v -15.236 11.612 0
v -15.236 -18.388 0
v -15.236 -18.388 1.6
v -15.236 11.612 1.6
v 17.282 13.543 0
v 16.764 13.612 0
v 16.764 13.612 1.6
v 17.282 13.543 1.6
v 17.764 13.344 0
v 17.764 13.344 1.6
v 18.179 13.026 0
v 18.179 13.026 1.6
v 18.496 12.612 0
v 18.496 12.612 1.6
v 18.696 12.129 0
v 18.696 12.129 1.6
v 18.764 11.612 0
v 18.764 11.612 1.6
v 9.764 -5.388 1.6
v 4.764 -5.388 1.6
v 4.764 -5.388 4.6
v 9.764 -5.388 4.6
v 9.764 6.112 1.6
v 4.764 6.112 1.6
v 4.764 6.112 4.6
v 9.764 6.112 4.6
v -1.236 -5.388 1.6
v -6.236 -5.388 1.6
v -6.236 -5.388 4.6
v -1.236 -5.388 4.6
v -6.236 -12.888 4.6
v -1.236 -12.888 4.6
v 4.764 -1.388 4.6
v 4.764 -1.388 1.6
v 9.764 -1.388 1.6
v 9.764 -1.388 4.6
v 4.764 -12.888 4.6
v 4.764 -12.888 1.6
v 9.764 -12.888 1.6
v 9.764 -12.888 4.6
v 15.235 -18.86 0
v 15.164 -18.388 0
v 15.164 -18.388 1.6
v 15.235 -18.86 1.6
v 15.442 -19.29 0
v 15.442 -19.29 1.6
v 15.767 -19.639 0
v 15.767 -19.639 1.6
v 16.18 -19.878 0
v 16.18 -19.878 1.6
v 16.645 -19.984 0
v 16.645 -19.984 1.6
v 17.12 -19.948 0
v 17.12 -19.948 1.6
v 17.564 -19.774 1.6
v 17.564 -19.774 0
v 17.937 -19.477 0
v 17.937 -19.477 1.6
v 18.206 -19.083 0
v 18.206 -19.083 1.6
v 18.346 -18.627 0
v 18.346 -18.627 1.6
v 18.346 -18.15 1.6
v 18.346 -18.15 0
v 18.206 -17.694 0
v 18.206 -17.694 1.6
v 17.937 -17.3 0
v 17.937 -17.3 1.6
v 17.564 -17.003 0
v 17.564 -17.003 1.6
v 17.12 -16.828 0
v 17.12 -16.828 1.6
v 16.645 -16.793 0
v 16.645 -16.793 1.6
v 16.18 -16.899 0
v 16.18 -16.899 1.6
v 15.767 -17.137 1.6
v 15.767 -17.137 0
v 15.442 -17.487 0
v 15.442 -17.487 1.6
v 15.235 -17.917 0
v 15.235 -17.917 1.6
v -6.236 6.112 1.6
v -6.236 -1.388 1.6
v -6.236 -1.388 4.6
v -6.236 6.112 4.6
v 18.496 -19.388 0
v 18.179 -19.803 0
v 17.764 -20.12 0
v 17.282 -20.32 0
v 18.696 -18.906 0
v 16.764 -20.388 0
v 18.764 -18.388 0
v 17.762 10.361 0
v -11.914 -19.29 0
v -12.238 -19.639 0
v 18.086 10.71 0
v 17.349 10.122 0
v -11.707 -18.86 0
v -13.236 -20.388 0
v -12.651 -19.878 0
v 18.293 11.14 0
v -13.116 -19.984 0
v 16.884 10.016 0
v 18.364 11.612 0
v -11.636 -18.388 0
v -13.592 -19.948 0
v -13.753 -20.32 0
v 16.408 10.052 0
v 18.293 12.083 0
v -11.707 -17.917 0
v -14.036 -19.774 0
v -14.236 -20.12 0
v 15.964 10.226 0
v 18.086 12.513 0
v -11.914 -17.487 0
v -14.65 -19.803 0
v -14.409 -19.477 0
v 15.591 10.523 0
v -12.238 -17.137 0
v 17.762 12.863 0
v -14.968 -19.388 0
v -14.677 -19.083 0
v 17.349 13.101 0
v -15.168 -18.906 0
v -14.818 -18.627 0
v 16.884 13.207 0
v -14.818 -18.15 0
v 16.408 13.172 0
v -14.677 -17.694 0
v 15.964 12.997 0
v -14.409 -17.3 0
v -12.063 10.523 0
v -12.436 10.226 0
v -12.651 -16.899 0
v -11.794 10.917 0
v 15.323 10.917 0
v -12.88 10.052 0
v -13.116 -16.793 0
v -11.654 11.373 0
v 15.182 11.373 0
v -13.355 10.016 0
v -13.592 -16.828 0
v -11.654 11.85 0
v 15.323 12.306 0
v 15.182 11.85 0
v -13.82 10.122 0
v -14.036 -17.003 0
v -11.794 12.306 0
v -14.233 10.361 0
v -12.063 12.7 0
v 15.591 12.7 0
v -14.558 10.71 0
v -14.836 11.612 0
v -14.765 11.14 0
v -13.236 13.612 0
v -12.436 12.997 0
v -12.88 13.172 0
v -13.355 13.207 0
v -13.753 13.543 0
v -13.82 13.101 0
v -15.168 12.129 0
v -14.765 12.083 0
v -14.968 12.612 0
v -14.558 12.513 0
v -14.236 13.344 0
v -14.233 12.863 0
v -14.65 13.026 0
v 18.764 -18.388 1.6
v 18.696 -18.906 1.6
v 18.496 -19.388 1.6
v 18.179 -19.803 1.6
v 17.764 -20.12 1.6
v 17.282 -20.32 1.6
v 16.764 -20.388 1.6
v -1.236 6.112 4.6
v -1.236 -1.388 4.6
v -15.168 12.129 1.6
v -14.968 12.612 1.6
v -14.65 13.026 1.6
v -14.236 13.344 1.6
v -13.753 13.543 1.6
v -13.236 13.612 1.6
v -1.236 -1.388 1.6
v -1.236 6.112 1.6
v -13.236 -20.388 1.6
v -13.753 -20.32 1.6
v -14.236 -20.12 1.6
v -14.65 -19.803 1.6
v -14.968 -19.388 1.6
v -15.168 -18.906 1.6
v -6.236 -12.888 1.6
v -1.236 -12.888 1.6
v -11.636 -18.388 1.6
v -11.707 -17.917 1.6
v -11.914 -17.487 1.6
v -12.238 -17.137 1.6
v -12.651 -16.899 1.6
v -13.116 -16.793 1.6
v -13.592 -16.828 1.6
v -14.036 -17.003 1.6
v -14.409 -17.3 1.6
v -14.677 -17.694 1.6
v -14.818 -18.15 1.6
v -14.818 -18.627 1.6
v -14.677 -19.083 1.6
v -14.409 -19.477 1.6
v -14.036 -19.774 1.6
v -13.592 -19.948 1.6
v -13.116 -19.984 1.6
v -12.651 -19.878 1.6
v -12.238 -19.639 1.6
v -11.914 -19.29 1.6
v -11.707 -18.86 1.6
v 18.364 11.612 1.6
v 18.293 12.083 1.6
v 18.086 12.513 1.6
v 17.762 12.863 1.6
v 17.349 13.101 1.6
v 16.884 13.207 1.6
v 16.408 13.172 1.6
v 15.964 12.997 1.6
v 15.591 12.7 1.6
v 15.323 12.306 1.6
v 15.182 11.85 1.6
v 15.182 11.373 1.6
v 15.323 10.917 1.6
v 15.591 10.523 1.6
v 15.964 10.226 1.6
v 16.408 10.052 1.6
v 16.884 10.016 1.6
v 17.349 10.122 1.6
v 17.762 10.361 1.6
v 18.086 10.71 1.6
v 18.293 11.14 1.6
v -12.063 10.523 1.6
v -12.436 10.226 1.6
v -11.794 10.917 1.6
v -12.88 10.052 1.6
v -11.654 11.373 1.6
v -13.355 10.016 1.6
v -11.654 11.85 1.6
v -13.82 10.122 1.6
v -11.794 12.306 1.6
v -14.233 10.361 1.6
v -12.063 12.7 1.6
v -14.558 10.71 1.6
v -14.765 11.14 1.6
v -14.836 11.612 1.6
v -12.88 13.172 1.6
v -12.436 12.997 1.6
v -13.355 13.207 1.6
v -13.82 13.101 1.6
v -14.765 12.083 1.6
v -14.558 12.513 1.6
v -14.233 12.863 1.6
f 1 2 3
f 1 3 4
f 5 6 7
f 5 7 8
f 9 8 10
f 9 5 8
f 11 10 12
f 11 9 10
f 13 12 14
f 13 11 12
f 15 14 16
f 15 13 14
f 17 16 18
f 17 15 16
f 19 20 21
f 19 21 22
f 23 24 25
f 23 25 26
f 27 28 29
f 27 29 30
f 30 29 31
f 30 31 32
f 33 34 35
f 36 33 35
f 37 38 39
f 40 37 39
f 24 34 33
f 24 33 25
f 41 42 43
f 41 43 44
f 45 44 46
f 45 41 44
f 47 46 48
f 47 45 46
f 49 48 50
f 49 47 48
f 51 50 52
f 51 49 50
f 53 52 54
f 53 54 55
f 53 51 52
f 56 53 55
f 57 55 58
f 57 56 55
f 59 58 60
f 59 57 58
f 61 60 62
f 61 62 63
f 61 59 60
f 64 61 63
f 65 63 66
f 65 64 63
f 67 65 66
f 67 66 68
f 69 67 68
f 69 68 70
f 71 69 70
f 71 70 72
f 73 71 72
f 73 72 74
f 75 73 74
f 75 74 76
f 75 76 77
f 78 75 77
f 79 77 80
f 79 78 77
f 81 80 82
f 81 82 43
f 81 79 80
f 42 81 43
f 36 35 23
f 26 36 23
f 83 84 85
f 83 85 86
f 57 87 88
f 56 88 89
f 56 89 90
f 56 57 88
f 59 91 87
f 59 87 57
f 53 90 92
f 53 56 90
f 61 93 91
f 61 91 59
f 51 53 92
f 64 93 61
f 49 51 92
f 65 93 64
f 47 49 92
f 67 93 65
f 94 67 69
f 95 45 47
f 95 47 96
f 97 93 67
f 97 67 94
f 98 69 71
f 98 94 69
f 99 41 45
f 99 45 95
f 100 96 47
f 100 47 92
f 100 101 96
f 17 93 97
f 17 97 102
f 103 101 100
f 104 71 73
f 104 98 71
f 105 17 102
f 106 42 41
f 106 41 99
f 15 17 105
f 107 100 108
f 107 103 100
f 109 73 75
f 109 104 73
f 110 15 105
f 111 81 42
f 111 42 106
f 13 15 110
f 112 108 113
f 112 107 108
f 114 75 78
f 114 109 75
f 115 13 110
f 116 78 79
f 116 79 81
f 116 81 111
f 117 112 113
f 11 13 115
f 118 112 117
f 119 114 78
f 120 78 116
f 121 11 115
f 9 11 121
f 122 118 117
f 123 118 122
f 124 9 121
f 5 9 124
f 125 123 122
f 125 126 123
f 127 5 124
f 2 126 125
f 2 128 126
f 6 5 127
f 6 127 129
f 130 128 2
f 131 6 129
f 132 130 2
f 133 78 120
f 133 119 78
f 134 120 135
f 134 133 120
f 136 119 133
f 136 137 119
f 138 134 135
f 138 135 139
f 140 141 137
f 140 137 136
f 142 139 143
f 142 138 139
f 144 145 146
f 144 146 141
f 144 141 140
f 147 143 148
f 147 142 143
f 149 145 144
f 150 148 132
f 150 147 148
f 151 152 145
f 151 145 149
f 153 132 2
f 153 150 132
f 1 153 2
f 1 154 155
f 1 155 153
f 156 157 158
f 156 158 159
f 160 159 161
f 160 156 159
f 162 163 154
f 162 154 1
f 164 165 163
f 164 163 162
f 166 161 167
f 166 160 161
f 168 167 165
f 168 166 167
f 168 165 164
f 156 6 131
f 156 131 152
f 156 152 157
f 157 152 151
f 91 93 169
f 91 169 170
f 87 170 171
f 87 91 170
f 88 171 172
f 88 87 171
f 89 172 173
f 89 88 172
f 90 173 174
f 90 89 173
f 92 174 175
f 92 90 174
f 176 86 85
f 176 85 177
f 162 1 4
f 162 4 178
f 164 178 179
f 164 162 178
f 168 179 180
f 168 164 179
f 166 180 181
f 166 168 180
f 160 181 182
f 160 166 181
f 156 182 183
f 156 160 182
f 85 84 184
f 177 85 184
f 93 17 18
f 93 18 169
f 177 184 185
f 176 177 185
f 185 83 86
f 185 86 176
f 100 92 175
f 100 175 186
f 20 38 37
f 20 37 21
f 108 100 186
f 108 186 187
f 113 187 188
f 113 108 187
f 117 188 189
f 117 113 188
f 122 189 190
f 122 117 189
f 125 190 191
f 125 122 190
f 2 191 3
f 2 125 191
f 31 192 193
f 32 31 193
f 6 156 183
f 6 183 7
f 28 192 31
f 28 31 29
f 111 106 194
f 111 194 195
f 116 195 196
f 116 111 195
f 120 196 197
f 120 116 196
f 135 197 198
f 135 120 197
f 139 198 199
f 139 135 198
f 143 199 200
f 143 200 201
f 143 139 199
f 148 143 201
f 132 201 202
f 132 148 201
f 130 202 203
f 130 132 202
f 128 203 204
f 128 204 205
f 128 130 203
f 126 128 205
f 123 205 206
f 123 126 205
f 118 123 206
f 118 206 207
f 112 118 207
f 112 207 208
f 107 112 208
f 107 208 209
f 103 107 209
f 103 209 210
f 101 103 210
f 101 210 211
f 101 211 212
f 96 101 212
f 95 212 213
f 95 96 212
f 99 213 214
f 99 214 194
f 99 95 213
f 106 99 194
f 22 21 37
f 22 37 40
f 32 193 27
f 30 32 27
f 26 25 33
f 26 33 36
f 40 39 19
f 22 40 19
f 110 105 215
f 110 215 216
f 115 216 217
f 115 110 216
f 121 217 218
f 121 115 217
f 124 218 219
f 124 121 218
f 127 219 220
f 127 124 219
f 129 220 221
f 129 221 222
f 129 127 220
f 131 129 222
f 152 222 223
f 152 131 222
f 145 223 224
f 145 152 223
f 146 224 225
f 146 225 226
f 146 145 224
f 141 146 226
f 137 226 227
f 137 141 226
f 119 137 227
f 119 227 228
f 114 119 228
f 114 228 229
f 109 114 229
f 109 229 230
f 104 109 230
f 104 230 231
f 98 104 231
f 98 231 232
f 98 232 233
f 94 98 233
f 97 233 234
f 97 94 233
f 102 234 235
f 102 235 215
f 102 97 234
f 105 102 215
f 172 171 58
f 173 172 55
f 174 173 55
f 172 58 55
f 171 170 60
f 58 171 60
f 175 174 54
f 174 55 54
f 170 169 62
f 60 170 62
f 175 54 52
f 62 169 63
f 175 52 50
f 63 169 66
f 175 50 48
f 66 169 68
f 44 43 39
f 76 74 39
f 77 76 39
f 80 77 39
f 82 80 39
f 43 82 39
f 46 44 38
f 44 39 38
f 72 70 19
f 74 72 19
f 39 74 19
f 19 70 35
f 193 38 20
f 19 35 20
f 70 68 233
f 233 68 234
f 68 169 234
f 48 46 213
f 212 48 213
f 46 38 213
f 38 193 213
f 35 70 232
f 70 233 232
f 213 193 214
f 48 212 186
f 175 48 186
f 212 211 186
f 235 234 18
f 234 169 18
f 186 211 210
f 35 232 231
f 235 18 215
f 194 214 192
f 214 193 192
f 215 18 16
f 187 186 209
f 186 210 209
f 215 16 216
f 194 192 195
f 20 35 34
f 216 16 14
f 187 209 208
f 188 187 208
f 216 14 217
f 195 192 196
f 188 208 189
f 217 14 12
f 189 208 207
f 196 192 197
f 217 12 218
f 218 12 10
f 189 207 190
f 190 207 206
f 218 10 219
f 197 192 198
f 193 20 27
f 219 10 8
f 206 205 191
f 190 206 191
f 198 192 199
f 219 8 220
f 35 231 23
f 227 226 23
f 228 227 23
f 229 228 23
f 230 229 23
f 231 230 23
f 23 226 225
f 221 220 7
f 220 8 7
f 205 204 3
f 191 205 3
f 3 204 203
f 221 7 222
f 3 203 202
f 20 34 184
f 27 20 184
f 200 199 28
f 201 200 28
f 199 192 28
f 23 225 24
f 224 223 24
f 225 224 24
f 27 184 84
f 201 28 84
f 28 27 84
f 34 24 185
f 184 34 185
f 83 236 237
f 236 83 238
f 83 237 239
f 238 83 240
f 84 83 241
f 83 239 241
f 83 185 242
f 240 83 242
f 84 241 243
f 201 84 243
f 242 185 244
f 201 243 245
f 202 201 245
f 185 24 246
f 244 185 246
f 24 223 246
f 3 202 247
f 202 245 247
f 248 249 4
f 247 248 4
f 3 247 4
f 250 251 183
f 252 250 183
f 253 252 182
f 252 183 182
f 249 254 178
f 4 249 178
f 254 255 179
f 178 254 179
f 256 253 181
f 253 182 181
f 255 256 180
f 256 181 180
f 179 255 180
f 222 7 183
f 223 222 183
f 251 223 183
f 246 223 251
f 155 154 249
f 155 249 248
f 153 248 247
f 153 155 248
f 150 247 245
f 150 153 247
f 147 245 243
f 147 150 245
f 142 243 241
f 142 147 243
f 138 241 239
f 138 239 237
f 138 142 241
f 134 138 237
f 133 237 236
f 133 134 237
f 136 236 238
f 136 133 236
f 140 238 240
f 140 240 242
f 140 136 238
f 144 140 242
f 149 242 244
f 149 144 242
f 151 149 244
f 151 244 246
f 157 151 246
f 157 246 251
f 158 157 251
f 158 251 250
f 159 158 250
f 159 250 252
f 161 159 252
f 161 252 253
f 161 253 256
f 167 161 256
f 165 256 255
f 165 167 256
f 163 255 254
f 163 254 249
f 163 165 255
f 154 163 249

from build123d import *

# Parameters (mm, degrees)
SKETCH1_R           = 1.6
BOSS_EXTRUDE1_DEPTH = 1.6
SKETCH2_W           = 5
SKETCH2_H           = 7.5
BOSS_EXTRUDE2_DEPTH = 3


with BuildPart() as part:
    # Sketch1 → Boss-Extrude1 (new body)
    with BuildSketch(Plane.XY):
        with BuildLine():
            Line((-13.235657624, 13.611622239), (16.764342376, 13.611622239))
            ThreePointArc((16.764342376, 13.611622239), (18.178555938, 13.025835801), (18.764342376, 11.611622239))
            Line((18.764342376, 11.611622239), (18.764342376, -18.388377761))
            ThreePointArc((18.764342376, -18.388377761), (18.178555938, -19.802591324), (16.764342376, -20.388377761))
            Line((16.764342376, -20.388377761), (-13.235657624, -20.388377761))
            ThreePointArc((-13.235657624, -20.388377761), (-14.649871187, -19.802591324), (-15.235657624, -18.388377761))
            Line((-15.235657624, -18.388377761), (-15.235657624, 11.611622239))
            ThreePointArc((-15.235657624, 11.611622239), (-14.649871187, 13.025835801), (-13.235657624, 13.611622239))
        make_face()
        with Locations((16.764342376, 11.611622239)):
            Circle(SKETCH1_R, mode=Mode.SUBTRACT)
        with Locations(Location((16.764342376, -18.388377761, 0), (0, 0, 180))):
            Circle(SKETCH1_R, mode=Mode.SUBTRACT)
        with Locations(Location((-13.235657624, 11.611622239, 0), (0, 0, 180))):
            Circle(SKETCH1_R, mode=Mode.SUBTRACT)
        with Locations((-13.235657624, -18.388377761)):
            Circle(SKETCH1_R, mode=Mode.SUBTRACT)
    extrude(amount=BOSS_EXTRUDE1_DEPTH)

    # Sketch2 → Boss-Extrude2 (add)
    with BuildSketch(Plane.XY.offset(1.6)):
        with Locations((7.264342376, 2.361622239)):
            Rectangle(SKETCH2_W, SKETCH2_H)
        with Locations((7.264342376, -9.138377761)):
            Rectangle(SKETCH2_W, SKETCH2_H)
        with Locations((-3.735657624, -9.138377761)):
            Rectangle(SKETCH2_W, SKETCH2_H)
        with Locations((-3.735657624, 2.361622239)):
            Rectangle(SKETCH2_W, SKETCH2_H)
    extrude(amount=BOSS_EXTRUDE2_DEPTH)


solid = part.part
